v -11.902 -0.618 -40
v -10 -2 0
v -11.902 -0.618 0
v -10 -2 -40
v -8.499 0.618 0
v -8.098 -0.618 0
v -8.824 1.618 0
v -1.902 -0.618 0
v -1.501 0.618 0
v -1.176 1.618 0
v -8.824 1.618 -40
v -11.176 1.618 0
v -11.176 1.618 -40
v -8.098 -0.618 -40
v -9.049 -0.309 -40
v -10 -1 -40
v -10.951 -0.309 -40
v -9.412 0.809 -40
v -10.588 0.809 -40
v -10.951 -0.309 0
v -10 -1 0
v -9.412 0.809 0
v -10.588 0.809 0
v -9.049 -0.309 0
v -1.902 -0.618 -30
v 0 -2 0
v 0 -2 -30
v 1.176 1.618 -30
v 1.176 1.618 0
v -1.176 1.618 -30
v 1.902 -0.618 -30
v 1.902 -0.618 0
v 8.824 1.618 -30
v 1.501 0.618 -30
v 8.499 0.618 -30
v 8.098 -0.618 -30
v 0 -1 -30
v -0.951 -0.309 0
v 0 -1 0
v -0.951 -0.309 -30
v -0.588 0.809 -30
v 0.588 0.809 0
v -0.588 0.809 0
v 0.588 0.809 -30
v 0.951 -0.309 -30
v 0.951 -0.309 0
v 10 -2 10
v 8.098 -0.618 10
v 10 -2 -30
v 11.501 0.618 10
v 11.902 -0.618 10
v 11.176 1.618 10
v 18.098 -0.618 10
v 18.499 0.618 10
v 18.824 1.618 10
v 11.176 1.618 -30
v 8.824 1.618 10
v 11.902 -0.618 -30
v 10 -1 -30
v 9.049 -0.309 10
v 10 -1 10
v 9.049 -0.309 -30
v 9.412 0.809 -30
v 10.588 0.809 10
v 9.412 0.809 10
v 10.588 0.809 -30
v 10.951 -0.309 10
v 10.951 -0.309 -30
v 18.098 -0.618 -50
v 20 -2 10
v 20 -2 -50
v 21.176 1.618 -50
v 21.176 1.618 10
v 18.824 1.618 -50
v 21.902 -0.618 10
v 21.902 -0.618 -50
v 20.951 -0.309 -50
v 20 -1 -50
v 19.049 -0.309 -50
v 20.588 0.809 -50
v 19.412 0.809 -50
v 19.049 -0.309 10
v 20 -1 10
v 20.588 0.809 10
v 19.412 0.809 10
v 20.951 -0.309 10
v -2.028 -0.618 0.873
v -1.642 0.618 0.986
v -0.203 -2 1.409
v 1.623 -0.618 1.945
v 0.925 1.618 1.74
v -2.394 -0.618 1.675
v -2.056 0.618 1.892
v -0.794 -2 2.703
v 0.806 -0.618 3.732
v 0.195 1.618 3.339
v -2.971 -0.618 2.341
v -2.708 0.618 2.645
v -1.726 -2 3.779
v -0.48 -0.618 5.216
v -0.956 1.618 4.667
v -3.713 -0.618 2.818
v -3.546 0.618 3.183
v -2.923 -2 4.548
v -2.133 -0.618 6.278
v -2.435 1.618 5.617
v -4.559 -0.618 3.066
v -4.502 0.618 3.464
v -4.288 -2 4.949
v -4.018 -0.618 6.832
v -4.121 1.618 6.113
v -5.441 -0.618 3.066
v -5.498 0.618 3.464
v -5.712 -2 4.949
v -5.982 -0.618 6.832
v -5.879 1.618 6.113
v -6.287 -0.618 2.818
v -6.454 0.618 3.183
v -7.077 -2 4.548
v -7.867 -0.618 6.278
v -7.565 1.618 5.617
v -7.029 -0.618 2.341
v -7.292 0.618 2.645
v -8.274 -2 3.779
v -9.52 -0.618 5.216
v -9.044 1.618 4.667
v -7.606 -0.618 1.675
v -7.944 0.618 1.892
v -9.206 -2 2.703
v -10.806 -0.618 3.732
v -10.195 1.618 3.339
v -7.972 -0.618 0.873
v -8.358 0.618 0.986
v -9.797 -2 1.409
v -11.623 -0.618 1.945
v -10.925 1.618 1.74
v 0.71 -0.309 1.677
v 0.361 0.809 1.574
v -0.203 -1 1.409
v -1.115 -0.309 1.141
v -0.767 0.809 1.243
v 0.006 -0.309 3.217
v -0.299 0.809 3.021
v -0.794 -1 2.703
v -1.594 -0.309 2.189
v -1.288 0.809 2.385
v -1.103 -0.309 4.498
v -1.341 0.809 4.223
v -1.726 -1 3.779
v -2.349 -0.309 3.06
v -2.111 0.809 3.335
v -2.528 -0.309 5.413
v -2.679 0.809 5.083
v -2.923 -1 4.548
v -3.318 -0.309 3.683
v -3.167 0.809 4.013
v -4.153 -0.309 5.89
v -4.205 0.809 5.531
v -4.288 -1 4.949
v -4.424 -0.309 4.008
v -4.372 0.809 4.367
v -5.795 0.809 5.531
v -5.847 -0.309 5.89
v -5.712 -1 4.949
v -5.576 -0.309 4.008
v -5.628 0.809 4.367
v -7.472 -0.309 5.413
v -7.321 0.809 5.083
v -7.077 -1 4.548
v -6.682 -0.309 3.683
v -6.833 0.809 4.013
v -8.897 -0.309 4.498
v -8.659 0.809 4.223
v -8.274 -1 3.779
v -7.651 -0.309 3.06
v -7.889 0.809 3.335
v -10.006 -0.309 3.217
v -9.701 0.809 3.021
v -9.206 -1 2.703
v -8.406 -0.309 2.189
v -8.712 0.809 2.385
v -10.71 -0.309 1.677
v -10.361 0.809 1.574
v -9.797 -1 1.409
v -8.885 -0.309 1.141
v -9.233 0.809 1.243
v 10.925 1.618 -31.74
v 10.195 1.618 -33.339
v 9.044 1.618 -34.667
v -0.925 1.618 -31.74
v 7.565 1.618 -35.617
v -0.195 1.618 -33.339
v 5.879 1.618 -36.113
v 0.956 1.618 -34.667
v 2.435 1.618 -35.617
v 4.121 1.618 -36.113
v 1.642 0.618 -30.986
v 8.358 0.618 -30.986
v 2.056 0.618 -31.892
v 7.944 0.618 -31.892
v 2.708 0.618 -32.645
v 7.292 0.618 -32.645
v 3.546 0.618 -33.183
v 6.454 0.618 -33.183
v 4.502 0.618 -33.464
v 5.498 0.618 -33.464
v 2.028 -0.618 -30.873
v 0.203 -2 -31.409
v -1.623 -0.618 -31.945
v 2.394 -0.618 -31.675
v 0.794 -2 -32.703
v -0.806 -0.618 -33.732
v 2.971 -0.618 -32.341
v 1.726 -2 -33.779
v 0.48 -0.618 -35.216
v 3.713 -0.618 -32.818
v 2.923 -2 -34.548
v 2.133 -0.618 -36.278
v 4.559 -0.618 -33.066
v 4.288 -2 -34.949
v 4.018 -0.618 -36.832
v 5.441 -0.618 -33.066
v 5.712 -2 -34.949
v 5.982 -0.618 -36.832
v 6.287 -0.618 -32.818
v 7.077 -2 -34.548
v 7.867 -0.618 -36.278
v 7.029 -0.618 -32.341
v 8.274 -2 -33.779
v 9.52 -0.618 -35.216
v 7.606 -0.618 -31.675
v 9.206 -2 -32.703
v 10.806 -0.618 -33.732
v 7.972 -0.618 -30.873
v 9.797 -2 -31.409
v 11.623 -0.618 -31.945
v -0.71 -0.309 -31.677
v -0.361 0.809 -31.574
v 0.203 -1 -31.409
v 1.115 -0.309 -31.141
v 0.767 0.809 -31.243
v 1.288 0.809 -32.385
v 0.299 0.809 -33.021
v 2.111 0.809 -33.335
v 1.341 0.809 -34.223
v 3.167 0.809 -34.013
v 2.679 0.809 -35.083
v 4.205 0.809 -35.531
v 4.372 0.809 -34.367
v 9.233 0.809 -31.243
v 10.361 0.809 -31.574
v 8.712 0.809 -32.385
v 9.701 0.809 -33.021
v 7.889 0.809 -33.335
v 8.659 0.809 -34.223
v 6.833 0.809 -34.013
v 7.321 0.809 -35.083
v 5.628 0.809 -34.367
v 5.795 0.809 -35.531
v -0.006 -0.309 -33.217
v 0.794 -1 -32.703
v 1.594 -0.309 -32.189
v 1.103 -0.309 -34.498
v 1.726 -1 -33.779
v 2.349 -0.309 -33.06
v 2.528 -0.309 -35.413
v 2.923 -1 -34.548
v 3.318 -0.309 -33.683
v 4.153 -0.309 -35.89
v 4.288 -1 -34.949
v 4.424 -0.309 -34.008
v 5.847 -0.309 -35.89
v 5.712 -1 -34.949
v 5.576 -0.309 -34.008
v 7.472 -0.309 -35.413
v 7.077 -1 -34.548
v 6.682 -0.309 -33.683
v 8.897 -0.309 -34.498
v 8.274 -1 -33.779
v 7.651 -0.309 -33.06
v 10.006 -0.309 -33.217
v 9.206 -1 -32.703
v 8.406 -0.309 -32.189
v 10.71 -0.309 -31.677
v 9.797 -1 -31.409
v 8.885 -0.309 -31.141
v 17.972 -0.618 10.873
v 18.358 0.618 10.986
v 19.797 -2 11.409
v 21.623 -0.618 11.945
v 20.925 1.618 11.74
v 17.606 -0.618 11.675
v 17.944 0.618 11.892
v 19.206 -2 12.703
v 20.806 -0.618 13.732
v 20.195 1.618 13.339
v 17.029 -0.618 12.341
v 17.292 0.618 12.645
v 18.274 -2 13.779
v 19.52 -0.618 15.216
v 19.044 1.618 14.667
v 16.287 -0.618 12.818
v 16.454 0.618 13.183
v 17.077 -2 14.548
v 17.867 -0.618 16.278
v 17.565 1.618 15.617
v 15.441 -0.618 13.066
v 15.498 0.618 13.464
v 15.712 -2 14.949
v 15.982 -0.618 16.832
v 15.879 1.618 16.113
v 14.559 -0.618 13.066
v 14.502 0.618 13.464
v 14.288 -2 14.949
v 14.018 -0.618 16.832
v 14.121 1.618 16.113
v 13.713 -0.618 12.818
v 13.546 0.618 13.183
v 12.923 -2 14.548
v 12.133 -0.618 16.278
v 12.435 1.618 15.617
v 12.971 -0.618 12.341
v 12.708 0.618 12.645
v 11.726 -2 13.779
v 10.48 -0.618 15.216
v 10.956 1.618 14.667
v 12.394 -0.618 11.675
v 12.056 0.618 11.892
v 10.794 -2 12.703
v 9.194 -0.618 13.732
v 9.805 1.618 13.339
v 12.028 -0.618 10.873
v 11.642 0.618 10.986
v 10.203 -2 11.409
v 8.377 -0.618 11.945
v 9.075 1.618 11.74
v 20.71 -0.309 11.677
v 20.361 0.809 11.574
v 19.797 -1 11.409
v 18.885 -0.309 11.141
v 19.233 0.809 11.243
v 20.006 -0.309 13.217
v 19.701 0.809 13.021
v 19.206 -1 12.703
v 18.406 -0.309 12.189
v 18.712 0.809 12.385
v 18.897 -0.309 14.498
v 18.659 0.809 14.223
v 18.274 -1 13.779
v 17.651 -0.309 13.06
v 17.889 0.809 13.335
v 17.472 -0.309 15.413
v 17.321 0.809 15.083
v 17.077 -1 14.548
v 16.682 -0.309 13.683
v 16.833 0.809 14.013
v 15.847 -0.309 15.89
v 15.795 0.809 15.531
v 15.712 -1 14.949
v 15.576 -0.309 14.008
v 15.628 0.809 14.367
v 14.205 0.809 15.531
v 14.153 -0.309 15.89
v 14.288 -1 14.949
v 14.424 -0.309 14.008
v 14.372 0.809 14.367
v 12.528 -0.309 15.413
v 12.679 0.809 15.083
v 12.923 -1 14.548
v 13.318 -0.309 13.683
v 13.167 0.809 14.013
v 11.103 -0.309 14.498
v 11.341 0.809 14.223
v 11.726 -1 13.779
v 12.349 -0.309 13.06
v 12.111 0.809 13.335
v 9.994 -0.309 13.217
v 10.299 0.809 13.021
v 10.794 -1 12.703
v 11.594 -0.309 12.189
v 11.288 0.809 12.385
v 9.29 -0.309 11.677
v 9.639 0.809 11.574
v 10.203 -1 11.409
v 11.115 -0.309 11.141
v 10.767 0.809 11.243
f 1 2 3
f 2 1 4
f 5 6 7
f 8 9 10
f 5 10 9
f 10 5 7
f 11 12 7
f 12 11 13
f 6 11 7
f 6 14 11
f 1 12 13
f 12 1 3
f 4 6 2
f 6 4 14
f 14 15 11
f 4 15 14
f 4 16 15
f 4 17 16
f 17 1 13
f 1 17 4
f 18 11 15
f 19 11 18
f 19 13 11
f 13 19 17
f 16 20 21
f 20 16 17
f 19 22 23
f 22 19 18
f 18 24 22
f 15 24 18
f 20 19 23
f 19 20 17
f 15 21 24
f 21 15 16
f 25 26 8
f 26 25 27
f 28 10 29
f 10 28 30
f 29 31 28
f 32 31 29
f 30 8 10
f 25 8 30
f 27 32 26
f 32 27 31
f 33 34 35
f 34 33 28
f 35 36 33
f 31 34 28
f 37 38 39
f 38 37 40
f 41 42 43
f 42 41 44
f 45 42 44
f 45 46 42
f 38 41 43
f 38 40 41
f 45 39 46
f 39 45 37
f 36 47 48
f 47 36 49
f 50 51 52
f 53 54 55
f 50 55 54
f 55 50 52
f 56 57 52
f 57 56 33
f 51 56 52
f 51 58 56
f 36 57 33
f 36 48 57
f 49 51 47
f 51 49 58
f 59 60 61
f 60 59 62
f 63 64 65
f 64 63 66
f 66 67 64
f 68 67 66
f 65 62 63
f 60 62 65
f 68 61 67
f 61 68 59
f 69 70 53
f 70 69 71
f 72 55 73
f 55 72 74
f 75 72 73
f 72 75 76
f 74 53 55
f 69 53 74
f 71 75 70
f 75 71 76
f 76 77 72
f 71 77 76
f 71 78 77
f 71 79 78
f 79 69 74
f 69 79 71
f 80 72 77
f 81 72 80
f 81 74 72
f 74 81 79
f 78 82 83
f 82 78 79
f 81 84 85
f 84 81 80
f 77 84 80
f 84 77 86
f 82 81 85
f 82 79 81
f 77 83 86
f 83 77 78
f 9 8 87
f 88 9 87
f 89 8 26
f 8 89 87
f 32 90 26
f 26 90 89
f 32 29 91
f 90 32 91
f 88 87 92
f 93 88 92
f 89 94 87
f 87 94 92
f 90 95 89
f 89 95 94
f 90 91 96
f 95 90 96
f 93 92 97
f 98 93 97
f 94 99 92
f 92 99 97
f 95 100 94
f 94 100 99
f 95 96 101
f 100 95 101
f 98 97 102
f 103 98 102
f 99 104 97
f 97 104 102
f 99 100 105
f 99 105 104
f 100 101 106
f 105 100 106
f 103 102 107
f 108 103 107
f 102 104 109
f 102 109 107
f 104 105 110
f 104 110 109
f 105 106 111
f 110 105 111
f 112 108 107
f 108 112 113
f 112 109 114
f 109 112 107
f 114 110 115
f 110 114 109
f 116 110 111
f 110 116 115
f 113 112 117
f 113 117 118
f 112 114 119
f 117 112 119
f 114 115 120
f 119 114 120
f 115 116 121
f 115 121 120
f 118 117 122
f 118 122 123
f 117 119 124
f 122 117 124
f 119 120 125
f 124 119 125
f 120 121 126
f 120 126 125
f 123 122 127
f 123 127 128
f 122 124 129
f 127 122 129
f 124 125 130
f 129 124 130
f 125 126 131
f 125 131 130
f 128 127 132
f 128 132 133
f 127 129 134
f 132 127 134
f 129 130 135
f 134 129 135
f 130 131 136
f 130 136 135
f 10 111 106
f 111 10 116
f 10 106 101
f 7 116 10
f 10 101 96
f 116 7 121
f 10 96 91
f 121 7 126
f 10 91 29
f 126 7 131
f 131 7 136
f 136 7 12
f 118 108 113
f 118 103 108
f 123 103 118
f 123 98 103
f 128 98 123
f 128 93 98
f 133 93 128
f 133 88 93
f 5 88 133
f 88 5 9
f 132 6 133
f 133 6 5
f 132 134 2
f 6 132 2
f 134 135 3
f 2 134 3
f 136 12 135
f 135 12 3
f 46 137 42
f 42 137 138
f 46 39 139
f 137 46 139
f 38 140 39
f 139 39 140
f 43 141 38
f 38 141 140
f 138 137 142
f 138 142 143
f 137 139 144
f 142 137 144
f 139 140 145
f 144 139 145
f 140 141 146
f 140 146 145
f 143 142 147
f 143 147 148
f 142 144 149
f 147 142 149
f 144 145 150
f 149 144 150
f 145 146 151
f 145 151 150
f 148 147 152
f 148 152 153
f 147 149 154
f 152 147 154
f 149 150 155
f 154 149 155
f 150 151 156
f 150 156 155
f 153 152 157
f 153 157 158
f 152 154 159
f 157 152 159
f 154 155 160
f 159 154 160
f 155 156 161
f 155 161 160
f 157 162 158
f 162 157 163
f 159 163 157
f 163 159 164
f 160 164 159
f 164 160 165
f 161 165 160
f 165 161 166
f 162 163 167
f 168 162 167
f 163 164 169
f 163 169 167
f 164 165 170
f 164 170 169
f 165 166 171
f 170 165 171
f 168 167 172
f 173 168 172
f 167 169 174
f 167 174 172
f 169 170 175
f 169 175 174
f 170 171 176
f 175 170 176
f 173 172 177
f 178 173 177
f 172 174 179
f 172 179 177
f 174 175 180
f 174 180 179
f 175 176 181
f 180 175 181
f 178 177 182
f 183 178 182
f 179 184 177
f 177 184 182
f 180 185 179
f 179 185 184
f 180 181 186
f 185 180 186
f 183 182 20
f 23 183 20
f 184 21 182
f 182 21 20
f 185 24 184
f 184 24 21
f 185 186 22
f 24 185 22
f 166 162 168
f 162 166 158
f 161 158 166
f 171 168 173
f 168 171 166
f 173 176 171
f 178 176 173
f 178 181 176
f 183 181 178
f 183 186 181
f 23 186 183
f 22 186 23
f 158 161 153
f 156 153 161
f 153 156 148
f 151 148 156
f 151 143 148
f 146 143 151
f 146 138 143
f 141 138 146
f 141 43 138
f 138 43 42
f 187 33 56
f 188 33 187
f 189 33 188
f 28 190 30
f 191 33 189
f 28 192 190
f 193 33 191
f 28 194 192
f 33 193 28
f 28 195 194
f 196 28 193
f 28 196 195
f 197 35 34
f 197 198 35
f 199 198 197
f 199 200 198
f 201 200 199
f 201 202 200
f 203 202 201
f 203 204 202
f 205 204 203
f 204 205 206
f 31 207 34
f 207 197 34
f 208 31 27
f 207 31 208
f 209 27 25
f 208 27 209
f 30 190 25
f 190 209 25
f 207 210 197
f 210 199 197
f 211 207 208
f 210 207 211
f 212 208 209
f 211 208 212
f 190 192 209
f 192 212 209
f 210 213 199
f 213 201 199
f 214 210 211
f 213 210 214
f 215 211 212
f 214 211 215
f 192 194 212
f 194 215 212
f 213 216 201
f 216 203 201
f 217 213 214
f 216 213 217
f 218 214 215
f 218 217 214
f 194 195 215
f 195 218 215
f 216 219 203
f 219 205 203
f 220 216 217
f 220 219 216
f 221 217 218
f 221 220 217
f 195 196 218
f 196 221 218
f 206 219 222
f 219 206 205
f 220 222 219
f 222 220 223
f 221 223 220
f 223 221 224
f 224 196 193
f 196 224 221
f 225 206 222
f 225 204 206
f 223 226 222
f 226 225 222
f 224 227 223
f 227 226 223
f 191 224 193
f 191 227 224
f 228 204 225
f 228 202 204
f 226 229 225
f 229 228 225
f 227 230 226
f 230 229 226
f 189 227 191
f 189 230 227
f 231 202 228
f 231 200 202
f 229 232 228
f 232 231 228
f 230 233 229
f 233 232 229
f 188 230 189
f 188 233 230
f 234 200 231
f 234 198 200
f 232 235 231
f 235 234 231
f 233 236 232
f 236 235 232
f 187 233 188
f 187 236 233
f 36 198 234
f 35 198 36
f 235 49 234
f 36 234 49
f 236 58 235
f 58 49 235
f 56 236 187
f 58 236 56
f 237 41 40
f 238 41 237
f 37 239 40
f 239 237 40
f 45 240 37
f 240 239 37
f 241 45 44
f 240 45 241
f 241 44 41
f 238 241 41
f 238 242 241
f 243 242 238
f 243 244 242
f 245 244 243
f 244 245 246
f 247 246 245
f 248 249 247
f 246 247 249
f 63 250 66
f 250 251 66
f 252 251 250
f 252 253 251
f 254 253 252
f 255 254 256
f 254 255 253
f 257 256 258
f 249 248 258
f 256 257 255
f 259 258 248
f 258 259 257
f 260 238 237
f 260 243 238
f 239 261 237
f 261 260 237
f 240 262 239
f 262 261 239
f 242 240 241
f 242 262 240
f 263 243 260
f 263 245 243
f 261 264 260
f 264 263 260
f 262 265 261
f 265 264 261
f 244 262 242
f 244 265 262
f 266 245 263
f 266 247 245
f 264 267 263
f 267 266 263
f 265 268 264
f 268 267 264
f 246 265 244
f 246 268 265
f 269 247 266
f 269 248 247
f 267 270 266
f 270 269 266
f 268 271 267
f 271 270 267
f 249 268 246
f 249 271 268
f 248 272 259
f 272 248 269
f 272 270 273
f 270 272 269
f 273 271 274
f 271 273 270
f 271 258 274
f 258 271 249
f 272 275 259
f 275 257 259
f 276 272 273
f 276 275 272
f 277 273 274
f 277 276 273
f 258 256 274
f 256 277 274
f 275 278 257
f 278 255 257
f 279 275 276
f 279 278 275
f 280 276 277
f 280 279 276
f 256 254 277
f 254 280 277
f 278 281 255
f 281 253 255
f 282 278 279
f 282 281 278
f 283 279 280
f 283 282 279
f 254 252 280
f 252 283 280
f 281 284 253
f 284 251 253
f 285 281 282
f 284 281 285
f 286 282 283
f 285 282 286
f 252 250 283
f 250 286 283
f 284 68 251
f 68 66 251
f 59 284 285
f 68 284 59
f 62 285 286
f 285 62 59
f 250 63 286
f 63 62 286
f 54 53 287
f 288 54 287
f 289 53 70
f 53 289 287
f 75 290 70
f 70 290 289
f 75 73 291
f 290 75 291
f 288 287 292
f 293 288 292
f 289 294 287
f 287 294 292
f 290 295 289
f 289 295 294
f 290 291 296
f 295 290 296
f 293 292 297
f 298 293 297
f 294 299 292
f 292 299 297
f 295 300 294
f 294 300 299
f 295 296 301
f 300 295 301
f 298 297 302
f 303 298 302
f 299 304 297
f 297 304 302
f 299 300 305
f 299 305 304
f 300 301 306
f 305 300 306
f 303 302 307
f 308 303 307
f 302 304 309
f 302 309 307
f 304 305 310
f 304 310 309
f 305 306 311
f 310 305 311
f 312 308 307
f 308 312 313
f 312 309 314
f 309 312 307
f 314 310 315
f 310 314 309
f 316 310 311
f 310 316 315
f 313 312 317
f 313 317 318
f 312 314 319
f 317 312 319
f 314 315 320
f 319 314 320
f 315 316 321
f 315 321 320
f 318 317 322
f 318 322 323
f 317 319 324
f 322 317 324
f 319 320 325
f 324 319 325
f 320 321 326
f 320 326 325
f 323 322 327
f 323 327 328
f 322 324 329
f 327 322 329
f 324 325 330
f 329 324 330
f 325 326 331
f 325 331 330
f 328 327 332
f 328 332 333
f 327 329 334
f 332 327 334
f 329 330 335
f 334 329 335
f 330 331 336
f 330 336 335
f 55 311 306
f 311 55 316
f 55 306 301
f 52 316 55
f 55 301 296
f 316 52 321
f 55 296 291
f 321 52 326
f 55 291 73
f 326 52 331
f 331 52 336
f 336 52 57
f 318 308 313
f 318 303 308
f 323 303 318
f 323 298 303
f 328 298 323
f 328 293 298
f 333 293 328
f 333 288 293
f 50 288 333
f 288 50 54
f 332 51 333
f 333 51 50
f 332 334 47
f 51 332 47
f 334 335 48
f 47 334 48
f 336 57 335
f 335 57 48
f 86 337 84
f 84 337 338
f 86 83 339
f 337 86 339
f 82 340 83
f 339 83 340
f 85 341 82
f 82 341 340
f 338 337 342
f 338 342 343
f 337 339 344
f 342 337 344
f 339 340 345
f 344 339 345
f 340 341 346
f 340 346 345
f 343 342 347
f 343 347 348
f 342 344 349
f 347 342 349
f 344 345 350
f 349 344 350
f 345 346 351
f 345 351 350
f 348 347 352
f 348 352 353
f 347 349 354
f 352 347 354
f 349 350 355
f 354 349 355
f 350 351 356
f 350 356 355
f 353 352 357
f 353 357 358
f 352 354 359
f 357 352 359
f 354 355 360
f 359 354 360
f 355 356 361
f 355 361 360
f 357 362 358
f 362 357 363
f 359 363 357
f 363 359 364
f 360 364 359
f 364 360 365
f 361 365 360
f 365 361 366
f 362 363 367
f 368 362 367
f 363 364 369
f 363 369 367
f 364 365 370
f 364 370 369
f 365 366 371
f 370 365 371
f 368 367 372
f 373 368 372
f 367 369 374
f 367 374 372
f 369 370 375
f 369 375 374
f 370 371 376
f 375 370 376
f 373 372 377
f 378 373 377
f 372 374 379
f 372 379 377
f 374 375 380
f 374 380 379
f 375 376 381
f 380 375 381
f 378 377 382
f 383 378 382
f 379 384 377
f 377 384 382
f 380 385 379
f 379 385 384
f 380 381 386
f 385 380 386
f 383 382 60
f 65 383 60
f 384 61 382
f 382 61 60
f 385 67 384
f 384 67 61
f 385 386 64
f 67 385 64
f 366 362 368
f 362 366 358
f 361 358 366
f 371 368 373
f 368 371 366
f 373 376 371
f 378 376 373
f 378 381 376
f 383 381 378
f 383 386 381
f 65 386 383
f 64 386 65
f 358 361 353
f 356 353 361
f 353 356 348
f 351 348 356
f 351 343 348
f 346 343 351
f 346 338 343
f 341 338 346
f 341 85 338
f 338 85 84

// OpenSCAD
// file: lib/metric.scad
IN_MM = 25.4;
// PI = PI
phi = 1.61803398875;
e = 2.71828182846;

m3_nut_or = 6.5 / 2;
m3_nut_h = 2.6;

m4_nut_or = 7.7 / 2;
m4_nut_h = 3.2;

m5_nut_or = 8.8 / 2;
m5_nut_h = 4.7;
m5_washer_h = 1;

m6_nut_or = 11.1 / 2;
m6_nut_h = 5.2;

m8_nut_or = 14.5/2;
m8_nut_h = 6.3;

m10_nut_or = 18.3/2;
m10_nut_h = 7.9;

m12_nut_or = 20.3/2;
m12_nut_h = 9.75;

module m_nut(ir, or, h, core=false) {
	difference() {
		cylinder(r=or, h=h, center=true, $fn=6);
		if (core) cylinder(r=ir, h=h, center=true);
	}

}

module m3_nut(core=false) {
	m_nut(3/2, m3_nut_or, m3_nut_h+0.1, core);
}

module m4_nut(core=false) {
	m_nut(4/2, m4_nut_or, m4_nut_h+0.1, core);
}

module m5_nut(core=false) {
	m_nut(5/2, m5_nut_or, m5_nut_h+0.1, core);
}

module m6_nut(core=false) {
	m_nut(6/2, m6_nut_or, m6_nut_h+0.1, core);
}

module m8_nut(core=false) {
	m_nut(8/2, m8_nut_or, m8_nut_h+0.1, core);
}

module m10_nut(core=false) {
	m_nut(10/2, m10_nut_or, m10_nut_h+0.1, core);
}

module m12_nut(core=false) {
	m_nut(12/2, m12_nut_or, m12_nut_h+0.1, core);
}
// file: lib/sprockets.scad
// Sprockets
//
// Sprocket construction module by Shawn Steele (c) 2013
// License is MS-PL http://opensource.org/licenses/ms-pl
//
// Used to make sprockets for L3-G0 model, http://L3-G0.blogspot.com,
// Please attribute above if redistributing/modifying.
// 
// http://www.gizmology.net/sprockets.htm has some geometry on sprockets.
//
// I built this for use with #25 roller chain, so any other sizes may need
// tweaking.  You also may need to adjust stuff for your printer or
// whatever, I used an original Replicator clone.
//
// Usage:
//
// use <sprockets.scad>
// sprocket(size, teeth, bore, hub_diameter, hub_height);
//
//   size:          ANSI Roller Chain Standard Sizes, default 25, or motorcycle sizes,
//                  or 1 for bike w/derailleur or 2 for bike w/o derailleur
//   teeth:         Number of teeth on the sprocket, default 9
//   bore:          Bore diameter, inches (Chain sizes seem to favor inches), default 5/16
//   hub_diameter:  Hub diameter, inches, default 0
//   hub_height:    Hub height TOTAL, default 0.
//
// You may also need to tweak some of the fudge factors, depending on your
// printer, etc.  See the constants below.
//
// Example:
//
// use <sprockets.scad>
$fn = 180;

sprocket(25, 9, 5/16, 0, 0);

// Adjust these if it's too tight/loose on your printer,
// These seem to be OK on my Replicator 1
FUDGE_BORE=0;	 // mm to fudge the edges of the bore
FUDGE_ROLLER=0; // mm to fudge the hole for the rollers
FUDGE_TEETH=1;  // Additional rounding of the teeth (0 is theoretical,
                // my rep 1 seems to need 1 on medium.)

function inches2mm(inches) = inches * 25.4;
function mm2inches(mm) = mm / 25.4;

module sprocket(size=25, teeth=9, bore=5/16, hub_diameter=0, hub_height=0)
{
	bore_radius_mm = inches2mm(bore)/2;
	hub_radius_mm = inches2mm(hub_diameter)/2;
	hub_height_mm = inches2mm(hub_height);

	difference()
	{
		union()
		{
			sprocket_plate(size, teeth);
			if (hub_diameter != 0 && hub_height != 0)
			cylinder(h=hub_height_mm, r=hub_radius_mm);
		}

		// Make sure the bore goes through everything
		if (bore != 0)
		{
			translate([0,0,-1])
			cylinder(h=2+hub_height_mm+inches2mm(get_thickness(size)), r=bore_radius_mm+FUDGE_BORE);
		}
	}
}

module sprocket_plate(size, teeth)
{
	angle = 360/teeth;
	pitch=inches2mm(get_pitch(size));
	roller=inches2mm(get_roller_diameter(size)/2);
	thickness=inches2mm(get_thickness(size));
	outside_radius = inches2mm(get_pitch(size)*(0.6+1/tan(180/teeth))) / 2;
	pitch_radius = inches2mm(get_pitch(size)/sin(180/teeth)) / 2;

	echo("Pitch=", mm2inches(pitch));
	echo("Pitch mm=", pitch);
	echo("Roller=", mm2inches(roller));
	echo("Roller mm=", roller);
	echo("Thickness=", mm2inches(thickness));
	echo("Thickness mm=", thickness);

	echo("Outside diameter=", mm2inches(outside_radius * 2));
	echo("Outside diameter mm=", outside_radius * 2);
	echo("Pitch Diameter=", mm2inches(pitch_radius * 2));
	echo("Pitch Diameter mm=", pitch_radius * 2);

	middle_radius = sqrt(pow(pitch_radius,2) - pow(pitch/2,2));

	// rotating the fudge is going to put curves in a funny place
	fudge_teeth_x = FUDGE_TEETH * cos(angle/2);
	fudge_teeth_y = FUDGE_TEETH * sin(angle/2);

	difference()
	{
		union()
		{
			// Main plate
//			cylinder(r=pitch_radius-roller+.1, h=thickness);

			intersection()
			{
				// Trim outer points
				translate([0,0,-1])
//				cylinder(r=outside_radius,h=thickness+2);	//logic for shorter teeth
				cylinder(r=pitch_radius-roller+pitch/2, h=thickness+2);

				// Main section
				union()
				{
					// Build the teeth
					for (sprocket=[0:teeth-1])
					{
						// Rotate current sprocket by angle
						rotate([0,0,angle*sprocket])
						intersection()
						{
							translate([-fudge_teeth_x,pitch_radius-fudge_teeth_y,0])
							cylinder(r=pitch-roller-FUDGE_ROLLER-FUDGE_TEETH,h=thickness);
	
							rotate([0,0,angle])
							translate([fudge_teeth_x,pitch_radius-fudge_teeth_y,0])
							cylinder(r=pitch-roller-FUDGE_ROLLER-FUDGE_TEETH,h=thickness);					
						}
					}

					// Make sure to fill the gap in the bottom
					for (sprocket=[0:teeth-1])
					{
						rotate([0,0,angle*sprocket-angle/2])
						translate([-pitch/2,-.01,0])
						cube([pitch,middle_radius+.01,thickness]);
					}
				}
			}
		}

		// Remove holes for the rollers
		for (sprocket=[0:teeth-1])
		{
			rotate([0,0,angle*sprocket])
			translate([0,pitch_radius,-1])
			cylinder(r=roller+FUDGE_ROLLER,h=thickness+2);

// 		I used this for debugging the geometry, it draws guide lines
//			rotate([0,0,angle*sprocket])
//			draw_guides(roller, thickness, pitch, height);
		}
	}

	// guide line for pitch radius
//	cylinder(h=.1,r=outside_radius);
//	cylinder(h=.2,r=pitch_radius);
}

/*
// I used this for debugging the geometry, it draws guide lines
module draw_guides(roller, thickness, pitch, height)
{
	translate([0,-.05,0])
	cube([50,0.1,1]);
	translate([0,pitch-.05,0])
	cube([50,0.1,1]);
	translate([0,-pitch-.05,0])
	cube([50,0.1,1]);
}*/

function get_pitch(size) =
	// ANSI
	size == 25 ? 1/4 :
	size == 35 ? 3/8 :
	size == 40 ? 1/2 :
	size == 41 ? 1/2 :
	size == 50 ? 5/8 :
	size == 60 ? 3/4 :
	size == 80 ? 1 :
	// Bike
	size == 1 ? 1/2 :
	size == 2 ? 1/2 :
	// Motorcycle
	size == 420 ? 1/2 :
	size == 425 ? 1/2 :
	size == 428 ? 1/2 :
	size == 520 ? 5/8 :
	size == 525 ? 5/8 :
	size == 530 ? 5/8 :
	size == 630 ? 3/4 :
	// unknown
	0;

function get_roller_diameter(size) =
	// ANSI
	size == 25 ? .130 :
	size == 35 ? .200 :
	size == 40 ? 5/16 :
	size == 41 ? .306 :
	size == 50 ? .400 :
	size == 60 ? 15/32 :
	size == 80 ? 5/8 :
	// Bike
	size == 1 ? 5/16 :
	size == 2 ? 5/16 :
	// Motorcycle
	size == 420 ? 5/16 :
	size == 425 ? 5/16 :
	size == 428 ? .335 :
	size == 520 ? .400 :
	size == 525 ? .400 :
	size == 530 ? .400 :
	size == 630 ? 15/32 :
	// unknown
	0;

// I think there's a formula for this, but by the
// time I realized that I already had the table...
function get_thickness(size) =
	// ANSI
	size == 25 ? .110 :
	size == 35 ? .168 :
	size == 40 ? .284 :
	size == 41 ? .227 :
	size == 50 ? .343 :
	size == 60 ? .459 :
	size == 80 ? .575 :
	// Bike
	size == 1 ? .110 :
	size == 2 ? .084 :
	// Motorcycle
	size == 420 ? .227 :
	size == 425 ? .284 :
	size == 428 ? .284 :
	size == 520 ? .227 :
	size == 525 ? .284 :
	size == 530 ? .343 :
	size == 630 ? .343 :
	// unknown
	0;
// main file
use <lib/sprockets.scad>;
include <lib/metric.scad>;

drive_teeth = 11;
axle_od = 6;

straw_ir = 1;
curve_ir = 5;
straw_l = 30;
straw_fn = 5;
straw_dl = 10;
straw_dl1 = straw_dl;
straw_dl2 = straw_dl;
straw_dl3 = straw_dl;
straw_dr = 360 / 10 / 2;


rotor_arm_w = 2 * (straw_ir + 1);
rotor_pitch = 40;
bubbler_or = 15;
bubbler_ir = 10;
bubbler_h = 2;
bubbler_vane_w = 1;
bubbler_num_vanes = 24;
basin_th = 2;
basin_extrude_angle = 360;


rt = 180 * $t;

module bubbler_head() {
    difference() {
        cylinder(h=bubbler_h, r=bubbler_or, center=true);
        cylinder(h=bubbler_h*3, r=bubbler_ir, center=true);
    }
    for (r=[0:360/bubbler_num_vanes:360])
        rotate([0, 0, r])
        translate([bubbler_ir - bubbler_vane_w, 0, -rotor_arm_w/2])
        cube([
            bubbler_or-bubbler_ir + bubbler_vane_w, 
            bubbler_vane_w, 
            rotor_arm_w], center=false);
}


// ! bubbler_head();

/*

module rotor() {
   
    difference() {
        union() {
            for (i=[-1, 1])
                translate([
                        i*rotor_pitch, 
                        0, 0])
                    bubbler_head();

            // translate([0, 0, rotor_arm_w/2])
            cube([
                rotor_pitch*2 - bubbler_or*2 + rotor_arm_w*2, 
                rotor_arm_w, rotor_arm_w], center=true);
            rotate([90, 0, 0])
                cylinder(r=4, h=rotor_arm_w, center=true);
        }
        rotate([90, 0, 0])
            cylinder(r=axle_od/2, h=100, center=true, $fn=32);

    }
}

// ! rotor();

module drive_sprocket() {
    sprocket(1, drive_teeth, axle_od / IN_MM, 0, 0);
}

// ! drive_sprocket();


bearing_h = 7;
bearing_ir = 4;
bearing_or = 11;
module bearing(core=true) {
    difference() {
        cylinder(r=bearing_or, h=bearing_h, center=true, $fn=128);
        if (core)
            cylinder(r=bearing_ir, h=bearing_h, center=true);
    }
}

module bearing_collar() {
    difference() {
        cylinder(
            r=bearing_or + basin_th + bearing_h, 
            h=bearing_h, center=true);
        bearing(false);

        translate([0, 0, bearing_h/2])
            rotate_extrude(angle=basin_extrude_angle, convexity=10) {
            translate([bearing_or + basin_th + bearing_h, 0])
                circle(r=bearing_h);
        }
    }
}

module basin_shell() {
    % rotate([90, 0, 90 + rt])
        rotor();
    difference() {
        union() {
            difference() {
                union() {
                    rotate_extrude(angle=basin_extrude_angle, convexity=10) {
                        translate([rotor_pitch, 0])
                            circle(r=bubbler_or + bubbler_vane_w + basin_th);
                    }
                    cylinder(
                        r=rotor_pitch, 
                        h=2*bubbler_or + 2*basin_th, 
                        center=true);
                    // # translate([
                    //         0, 
                    //         rotor_pitch, 0])
                    //     sphere(r=bubbler_or + bubbler_vane_w + basin_th);
                    
                }

                // translate([bearing_or + basin_th, -60, -60])
                //     cube([120, 120, 120]);
                cylinder(
                    r=rotor_pitch, 
                    h=2*bubbler_or, 
                    center=true);
            }
            translate([
                    bearing_or + basin_th * 2, 0, 0])
                cube([
                    basin_th, rotor_pitch*2, 
                    bubbler_or*2 + 2*basin_th], center=true);
            // cylinder(
            //     r=rotor_pitch - bubbler_or, 
            //     h=bubbler_vane_w + 4*basin_th, 
            //     center=true);
            for (i=[-1, 1])
                translate([
                    0, 0, i * (
                        bearing_h/2 + bubbler_or + basin_th)])
                rotate([90 - i*90, 0, 0])
                bearing_collar();
        }
        cylinder(
            r=rotor_pitch, 
            h=rotor_arm_w + basin_th, 
            center=true);
        rotate_extrude(angle=basin_extrude_angle, convexity=10) {
            translate([rotor_pitch, 0])
                circle(r=bubbler_or + bubbler_vane_w);
            
        }
        
        cylinder(r=axle_od/2 + 0.5, h=100, center=true, $fn=32);

        translate([bearing_or + 2*basin_th, -60, -60])
            cube([120, 120, 120]);
    }
}

// ! basin_shell();

module basin() {
    rotate([-90, 0, 0])
        basin_shell();

    // translate([0, bubbler_or - rotor_arm_w/2, 0])
    //     difference() {
        
    //     intersection() {
    //         sphere(r=rotor_or + rotor_arm_w + basin_th);
    //         # cube([
    //             2*(rotor_or + 2*rotor_arm_w + basin_th), 
    //             bubbler_or*2 + 2*basin_th + rotor_arm_w, 
    //             2*(rotor_or + 2*rotor_arm_w + basin_th)
    //         ], center=true);
    //     }
    //     sphere(r=rotor_or + rotor_arm_w);
    // }
}

// ! basin();

module design() {
    rotate([0, rt, 0])
        rotor();
    translate([0, -30, 0])
        rotate([90, rt, 0])
        drive_sprocket();

    basin();
}

// design();
*/



module straw(l=50, center=true) {
    difference() {
        rotate([0, 0, -straw_dr])
            cylinder(h=l, r=straw_ir + 1, center=false, $fn=straw_fn);
        if (center)
            rotate([0, 0, -straw_dr])
            cylinder(h=l, r=straw_ir, center=false, $fn=straw_fn);
    }
}

// ! straw();
module straw_xsection() {
    difference() {
        union() {
            translate([curve_ir, 0, 0])
                rotate([0, 0, straw_dr])
                circle(r=straw_ir + 1, $fn=straw_fn);
            translate([0, -(straw_ir + 1) * cos(360 / 5 / 2), 0])
                square([curve_ir + straw_ir, 1]);
        }
        translate([curve_ir, 0, 0])
            rotate([0, 0, straw_dr])
            circle(r=straw_ir, $fn=straw_fn);
    }
}

// ! straw_xsection();

module straw_curve(th=180) {
    rotate_extrude(angle=th) {
        straw_xsection();
    }
    // % translate([0, 0, -straw_ir - 1])
    //     cylinder(r=curve_ir+1, h=2);
}

// ! straw_curve();

module siphon_straw() {
    // translate([
    //         -straw_l/sqrt(2),
    //         0,
    //         -straw_l/sqrt(2)
    //     ])
    //     rotate([90, -135, 0])
    //     straw_curve(th=45);
    translate([-curve_ir * 2, 0, -straw_l - straw_dl1])
            straw(straw_l + straw_dl1, center=true);
    translate([
            -curve_ir, 
            0, 0])
        rotate([90, 0, 0])
        straw_curve();
    translate([
            0, 
            0, -straw_l])
        straw(straw_l);
    translate([
            curve_ir * 2, 
            0, -straw_l])
        straw(straw_l + straw_dl2);
    translate([
            curve_ir, 
            0, -straw_l])
        rotate([90, 180, 0])
            straw_curve();
    translate([
            curve_ir * 3, 
            0, 
            straw_dl2])
        rotate([90, 0, 0])
            straw_curve();
    translate([
            curve_ir * 4, 
            0, -straw_l - straw_dl3 - straw_dl1])
        straw(straw_l + straw_dl1 + straw_dl2 + straw_dl3);
}

// ! siphon_straw();

module self_siphon() {
    * translate([
            -straw_l/sqrt(2) - curve_ir - straw_ir,
            0,
            -straw_l/sqrt(2) - bubbler_or
        ]) {
        rotate([90, 0, 0])
            bubbler_head();
        * % difference() {
            sphere(r=bubbler_or+1);
            sphere(r=bubbler_or);
            rotate([90, 0, 0])
                cylinder(r=bubbler_ir, h=bubbler_or * 3, center=true);

            rotate([0, 45, 0]) {
                straw(bubbler_or+1, center=false);
                
            }

            if ($preview)
                cube([100, 100, 100]);  // TODO: comment

        }
    }
    siphon_straw();
}

self_siphon();
